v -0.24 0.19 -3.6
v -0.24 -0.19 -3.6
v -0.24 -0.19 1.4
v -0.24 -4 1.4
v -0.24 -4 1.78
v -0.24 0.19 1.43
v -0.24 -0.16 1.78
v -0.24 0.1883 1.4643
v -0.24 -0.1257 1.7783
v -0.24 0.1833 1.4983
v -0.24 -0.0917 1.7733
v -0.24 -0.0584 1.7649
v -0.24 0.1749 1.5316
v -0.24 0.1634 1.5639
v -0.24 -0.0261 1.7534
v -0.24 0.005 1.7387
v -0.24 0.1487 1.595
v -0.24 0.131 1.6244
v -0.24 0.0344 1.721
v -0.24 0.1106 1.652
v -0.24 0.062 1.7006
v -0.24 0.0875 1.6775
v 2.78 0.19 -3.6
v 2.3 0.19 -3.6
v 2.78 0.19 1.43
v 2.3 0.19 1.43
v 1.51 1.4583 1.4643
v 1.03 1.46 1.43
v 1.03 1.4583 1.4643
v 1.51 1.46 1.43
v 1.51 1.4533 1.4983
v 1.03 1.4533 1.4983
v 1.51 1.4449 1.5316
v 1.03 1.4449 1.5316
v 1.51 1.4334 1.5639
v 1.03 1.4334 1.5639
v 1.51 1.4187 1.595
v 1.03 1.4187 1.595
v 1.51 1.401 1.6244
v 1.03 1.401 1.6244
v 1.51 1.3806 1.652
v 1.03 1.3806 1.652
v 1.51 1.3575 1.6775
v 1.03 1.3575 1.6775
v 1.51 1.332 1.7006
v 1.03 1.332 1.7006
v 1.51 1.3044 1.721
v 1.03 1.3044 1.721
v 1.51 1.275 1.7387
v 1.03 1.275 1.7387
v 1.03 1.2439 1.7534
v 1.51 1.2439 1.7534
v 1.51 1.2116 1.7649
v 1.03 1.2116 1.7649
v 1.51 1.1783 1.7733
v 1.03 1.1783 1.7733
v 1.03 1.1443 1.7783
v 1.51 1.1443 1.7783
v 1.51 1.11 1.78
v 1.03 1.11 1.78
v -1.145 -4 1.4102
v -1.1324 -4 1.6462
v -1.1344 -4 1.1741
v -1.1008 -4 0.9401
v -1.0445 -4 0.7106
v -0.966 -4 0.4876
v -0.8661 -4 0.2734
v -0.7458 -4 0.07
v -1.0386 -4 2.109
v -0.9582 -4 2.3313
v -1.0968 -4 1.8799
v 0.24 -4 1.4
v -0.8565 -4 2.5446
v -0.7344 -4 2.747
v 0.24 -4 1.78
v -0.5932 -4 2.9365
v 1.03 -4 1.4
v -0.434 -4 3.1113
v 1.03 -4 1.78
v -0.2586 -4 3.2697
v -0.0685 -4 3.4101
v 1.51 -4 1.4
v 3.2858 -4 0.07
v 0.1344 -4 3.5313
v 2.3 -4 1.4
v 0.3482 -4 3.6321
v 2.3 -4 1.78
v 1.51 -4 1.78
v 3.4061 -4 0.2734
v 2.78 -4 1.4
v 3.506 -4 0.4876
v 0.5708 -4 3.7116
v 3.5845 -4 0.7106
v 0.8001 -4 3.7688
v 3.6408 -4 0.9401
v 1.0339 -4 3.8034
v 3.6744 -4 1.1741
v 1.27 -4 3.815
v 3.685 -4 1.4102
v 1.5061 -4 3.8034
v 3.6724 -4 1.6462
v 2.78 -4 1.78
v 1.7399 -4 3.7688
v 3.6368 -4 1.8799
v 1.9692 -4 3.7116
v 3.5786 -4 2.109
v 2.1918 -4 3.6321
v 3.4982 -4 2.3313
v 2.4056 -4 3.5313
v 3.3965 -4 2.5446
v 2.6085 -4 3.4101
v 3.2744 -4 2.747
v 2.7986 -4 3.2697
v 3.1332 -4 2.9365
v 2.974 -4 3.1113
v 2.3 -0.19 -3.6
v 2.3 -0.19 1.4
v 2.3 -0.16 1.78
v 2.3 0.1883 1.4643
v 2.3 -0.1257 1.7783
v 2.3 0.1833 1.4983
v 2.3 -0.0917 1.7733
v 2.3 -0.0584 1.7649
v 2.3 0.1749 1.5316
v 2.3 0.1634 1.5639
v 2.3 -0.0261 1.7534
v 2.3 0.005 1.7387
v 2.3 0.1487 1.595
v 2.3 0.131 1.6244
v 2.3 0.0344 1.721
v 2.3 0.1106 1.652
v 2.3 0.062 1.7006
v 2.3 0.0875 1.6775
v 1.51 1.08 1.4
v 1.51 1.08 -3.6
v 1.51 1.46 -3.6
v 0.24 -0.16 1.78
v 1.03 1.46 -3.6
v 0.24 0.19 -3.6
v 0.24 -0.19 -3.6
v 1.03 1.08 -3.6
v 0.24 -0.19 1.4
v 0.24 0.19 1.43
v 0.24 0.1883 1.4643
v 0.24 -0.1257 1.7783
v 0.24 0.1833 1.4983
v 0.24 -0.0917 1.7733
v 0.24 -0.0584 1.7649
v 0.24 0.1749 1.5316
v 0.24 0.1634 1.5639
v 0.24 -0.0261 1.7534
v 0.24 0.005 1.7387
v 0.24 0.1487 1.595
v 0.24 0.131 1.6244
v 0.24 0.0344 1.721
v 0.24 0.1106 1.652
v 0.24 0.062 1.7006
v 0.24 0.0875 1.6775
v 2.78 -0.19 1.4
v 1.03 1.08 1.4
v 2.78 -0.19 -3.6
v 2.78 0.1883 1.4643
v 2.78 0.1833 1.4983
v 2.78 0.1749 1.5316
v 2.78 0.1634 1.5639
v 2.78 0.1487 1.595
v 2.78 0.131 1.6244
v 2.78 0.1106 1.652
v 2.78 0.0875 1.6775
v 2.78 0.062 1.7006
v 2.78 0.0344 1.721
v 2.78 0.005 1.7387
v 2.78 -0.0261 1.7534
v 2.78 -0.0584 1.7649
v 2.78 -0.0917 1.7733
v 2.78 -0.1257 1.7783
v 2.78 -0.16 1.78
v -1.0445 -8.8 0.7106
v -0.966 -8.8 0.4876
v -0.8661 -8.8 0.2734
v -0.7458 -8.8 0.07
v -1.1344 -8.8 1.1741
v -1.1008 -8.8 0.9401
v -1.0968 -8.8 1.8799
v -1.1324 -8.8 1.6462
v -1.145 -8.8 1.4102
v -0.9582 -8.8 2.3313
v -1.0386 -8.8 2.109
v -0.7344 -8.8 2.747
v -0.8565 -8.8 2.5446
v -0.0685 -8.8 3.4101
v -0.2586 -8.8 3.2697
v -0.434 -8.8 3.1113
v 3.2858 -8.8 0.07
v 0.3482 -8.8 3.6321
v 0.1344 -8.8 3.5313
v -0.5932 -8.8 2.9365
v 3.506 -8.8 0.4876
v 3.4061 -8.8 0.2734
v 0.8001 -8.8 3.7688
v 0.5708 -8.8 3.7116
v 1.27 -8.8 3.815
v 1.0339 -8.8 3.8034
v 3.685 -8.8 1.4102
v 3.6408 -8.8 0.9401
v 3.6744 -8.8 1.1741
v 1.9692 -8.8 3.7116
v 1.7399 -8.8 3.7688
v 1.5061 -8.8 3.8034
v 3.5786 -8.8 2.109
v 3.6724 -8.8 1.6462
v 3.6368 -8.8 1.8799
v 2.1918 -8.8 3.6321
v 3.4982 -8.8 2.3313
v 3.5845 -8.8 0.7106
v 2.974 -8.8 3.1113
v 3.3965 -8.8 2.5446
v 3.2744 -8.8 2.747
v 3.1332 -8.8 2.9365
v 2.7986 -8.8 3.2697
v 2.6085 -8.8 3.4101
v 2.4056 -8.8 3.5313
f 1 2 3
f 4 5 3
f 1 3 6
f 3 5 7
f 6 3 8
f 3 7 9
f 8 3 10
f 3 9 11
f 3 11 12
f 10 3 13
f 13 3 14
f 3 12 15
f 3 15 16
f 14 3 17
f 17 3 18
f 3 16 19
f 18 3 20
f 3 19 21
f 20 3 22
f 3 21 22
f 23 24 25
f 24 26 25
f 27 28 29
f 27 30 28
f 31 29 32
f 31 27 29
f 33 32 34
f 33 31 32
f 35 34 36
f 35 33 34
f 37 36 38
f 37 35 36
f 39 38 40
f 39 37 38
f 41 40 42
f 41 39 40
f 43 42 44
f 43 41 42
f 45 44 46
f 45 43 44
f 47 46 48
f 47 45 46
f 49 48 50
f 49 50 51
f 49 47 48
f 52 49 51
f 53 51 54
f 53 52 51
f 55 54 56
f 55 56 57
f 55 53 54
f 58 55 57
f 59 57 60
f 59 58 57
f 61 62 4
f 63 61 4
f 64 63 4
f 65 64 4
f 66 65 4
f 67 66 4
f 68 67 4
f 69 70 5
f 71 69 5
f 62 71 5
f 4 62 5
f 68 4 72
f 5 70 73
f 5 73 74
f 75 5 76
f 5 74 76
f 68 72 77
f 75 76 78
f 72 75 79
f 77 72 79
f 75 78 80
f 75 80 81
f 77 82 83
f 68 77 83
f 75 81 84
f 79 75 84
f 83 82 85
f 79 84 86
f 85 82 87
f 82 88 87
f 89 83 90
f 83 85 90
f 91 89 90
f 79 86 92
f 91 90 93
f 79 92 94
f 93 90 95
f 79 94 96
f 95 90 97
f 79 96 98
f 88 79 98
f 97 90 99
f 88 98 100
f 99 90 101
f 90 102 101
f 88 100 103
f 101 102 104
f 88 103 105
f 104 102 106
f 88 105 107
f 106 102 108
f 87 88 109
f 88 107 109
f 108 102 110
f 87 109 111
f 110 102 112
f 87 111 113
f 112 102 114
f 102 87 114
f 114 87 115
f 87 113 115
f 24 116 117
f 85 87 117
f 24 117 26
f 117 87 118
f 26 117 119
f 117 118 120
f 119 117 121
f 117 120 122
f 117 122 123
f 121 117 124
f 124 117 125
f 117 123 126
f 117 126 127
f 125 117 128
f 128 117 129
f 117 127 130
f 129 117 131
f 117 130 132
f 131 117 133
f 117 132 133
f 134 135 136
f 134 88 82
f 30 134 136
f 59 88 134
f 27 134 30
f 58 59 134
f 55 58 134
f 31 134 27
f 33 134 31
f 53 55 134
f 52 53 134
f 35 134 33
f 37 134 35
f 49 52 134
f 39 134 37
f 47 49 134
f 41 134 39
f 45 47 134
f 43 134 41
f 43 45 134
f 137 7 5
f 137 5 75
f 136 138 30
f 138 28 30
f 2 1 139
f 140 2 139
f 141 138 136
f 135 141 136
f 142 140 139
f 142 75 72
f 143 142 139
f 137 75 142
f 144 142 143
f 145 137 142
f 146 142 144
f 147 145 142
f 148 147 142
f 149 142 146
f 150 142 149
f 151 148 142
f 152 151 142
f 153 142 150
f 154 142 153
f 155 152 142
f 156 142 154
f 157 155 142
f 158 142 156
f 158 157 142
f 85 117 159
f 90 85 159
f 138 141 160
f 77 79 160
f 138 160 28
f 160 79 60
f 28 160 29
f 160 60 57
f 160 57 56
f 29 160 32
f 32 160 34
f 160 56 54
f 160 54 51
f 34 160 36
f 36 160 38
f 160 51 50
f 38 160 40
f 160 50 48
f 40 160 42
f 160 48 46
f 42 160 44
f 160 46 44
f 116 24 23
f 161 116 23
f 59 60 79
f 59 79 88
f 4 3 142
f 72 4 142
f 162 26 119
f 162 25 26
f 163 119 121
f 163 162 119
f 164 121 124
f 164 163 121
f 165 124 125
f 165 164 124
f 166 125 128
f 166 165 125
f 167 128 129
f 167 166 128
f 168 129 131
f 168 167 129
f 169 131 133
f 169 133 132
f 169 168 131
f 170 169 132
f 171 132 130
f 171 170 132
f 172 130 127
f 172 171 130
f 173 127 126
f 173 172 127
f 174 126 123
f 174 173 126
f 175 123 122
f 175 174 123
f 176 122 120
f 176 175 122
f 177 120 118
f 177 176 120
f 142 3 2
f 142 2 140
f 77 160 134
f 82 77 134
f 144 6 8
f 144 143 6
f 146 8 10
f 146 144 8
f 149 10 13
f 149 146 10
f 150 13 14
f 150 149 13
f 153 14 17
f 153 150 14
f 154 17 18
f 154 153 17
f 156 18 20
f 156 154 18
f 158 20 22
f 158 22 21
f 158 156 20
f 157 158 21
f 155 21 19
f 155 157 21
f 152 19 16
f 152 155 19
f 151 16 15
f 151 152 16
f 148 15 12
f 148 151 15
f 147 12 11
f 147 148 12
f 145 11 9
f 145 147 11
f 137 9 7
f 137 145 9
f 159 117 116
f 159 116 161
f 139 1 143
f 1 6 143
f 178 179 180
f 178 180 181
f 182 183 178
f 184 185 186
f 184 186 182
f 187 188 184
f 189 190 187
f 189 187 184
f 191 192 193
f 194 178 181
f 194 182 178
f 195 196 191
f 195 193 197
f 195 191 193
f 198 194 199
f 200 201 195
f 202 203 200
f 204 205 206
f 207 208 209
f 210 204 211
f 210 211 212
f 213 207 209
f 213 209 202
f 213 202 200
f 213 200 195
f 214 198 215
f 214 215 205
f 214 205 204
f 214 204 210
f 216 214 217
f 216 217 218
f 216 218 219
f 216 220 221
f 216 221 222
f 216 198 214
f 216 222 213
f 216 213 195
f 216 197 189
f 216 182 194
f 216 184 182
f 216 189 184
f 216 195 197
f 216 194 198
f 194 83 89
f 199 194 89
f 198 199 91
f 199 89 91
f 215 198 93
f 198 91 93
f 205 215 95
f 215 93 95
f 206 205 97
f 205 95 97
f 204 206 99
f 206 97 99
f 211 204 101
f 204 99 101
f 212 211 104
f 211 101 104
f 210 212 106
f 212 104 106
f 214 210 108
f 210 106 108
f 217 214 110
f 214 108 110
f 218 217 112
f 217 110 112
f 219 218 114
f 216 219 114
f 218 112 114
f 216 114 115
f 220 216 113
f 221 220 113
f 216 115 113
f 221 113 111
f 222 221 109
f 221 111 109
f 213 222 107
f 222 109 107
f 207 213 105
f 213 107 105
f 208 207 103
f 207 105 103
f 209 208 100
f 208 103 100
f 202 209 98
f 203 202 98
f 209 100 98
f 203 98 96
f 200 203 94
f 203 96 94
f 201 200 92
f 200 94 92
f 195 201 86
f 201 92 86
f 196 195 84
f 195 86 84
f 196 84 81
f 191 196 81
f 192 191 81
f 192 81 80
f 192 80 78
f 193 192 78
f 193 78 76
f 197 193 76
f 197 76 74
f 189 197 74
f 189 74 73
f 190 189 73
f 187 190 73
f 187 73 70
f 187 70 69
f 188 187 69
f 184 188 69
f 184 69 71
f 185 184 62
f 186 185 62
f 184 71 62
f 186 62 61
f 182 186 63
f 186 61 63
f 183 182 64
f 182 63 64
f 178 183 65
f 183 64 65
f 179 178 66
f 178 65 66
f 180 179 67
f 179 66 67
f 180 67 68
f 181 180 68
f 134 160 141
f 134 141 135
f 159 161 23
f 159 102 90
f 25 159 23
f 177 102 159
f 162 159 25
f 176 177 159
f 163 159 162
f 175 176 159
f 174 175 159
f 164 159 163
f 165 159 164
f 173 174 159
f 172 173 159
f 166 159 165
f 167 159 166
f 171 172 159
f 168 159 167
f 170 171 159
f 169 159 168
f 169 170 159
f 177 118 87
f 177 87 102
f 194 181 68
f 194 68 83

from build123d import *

# Parameters (mm, degrees)
SKETCH001_W   = 0.48
SKETCH001_H   = 0.38
PAD001_DEPTH  = 5
PAD_DEPTH     = 4.8
SKETCH002_W   = 0.48
SKETCH002_H   = 4.3
SKETCH002_H_2 = 5.57
PAD002_DEPTH  = 0.38
FILLET_R      = 0.35


with BuildPart() as pad001:
    # Sketch001 → Pad001 (new body)
    with BuildSketch(Plane.XY.offset(1.4)):
        Rectangle(SKETCH001_W, SKETCH001_H)
        with Locations((1.27, 1.27)):
            Rectangle(SKETCH001_W, SKETCH001_H)
        with Locations((2.54, 0)):
            Rectangle(SKETCH001_W, SKETCH001_H)
    extrude(amount=-PAD001_DEPTH)


with BuildPart() as pad:
    # Sketch → Pad (new body)
    with BuildSketch(Plane(origin=(0, -4, 1.4), x_dir=(1, 0, 0), z_dir=(0, -1, 0))):
        with BuildLine():
            Line((-0.745769, -1.33), (3.285769, -1.33))
            ThreePointArc((3.285769, -1.33), (1.27, 2.415), (-0.745769, -1.33))
        make_face()
    extrude(amount=PAD_DEPTH)


with BuildPart() as fillet_mp_cp:
    # Sketch002 → Pad002 (new body)
    with BuildSketch(Plane.XY.offset(1.4)):
        with Locations((2.54, -1.96)):
            Rectangle(SKETCH002_W, SKETCH002_H)
        with Locations((1.27, -1.325)):
            Rectangle(SKETCH002_W, SKETCH002_H_2)
        with Locations((0, -1.96)):
            Rectangle(SKETCH002_W, SKETCH002_H)
    extrude(amount=PAD002_DEPTH)

    # Fillet
    fillet_edges = [fillet_mp_cp.edges().sort_by_distance(p)[0] for p in [
        (2.54, 0.19, 1.78),
        (0, 0.19, 1.78),
        (1.27, 1.46, 1.78),
    ]]
    fillet(fillet_edges, radius=FILLET_R)

    # Fillet_mp_cp: union Pad001, Pad
    add(pad001.part)
    add(pad.part)


solid = fillet_mp_cp.part
